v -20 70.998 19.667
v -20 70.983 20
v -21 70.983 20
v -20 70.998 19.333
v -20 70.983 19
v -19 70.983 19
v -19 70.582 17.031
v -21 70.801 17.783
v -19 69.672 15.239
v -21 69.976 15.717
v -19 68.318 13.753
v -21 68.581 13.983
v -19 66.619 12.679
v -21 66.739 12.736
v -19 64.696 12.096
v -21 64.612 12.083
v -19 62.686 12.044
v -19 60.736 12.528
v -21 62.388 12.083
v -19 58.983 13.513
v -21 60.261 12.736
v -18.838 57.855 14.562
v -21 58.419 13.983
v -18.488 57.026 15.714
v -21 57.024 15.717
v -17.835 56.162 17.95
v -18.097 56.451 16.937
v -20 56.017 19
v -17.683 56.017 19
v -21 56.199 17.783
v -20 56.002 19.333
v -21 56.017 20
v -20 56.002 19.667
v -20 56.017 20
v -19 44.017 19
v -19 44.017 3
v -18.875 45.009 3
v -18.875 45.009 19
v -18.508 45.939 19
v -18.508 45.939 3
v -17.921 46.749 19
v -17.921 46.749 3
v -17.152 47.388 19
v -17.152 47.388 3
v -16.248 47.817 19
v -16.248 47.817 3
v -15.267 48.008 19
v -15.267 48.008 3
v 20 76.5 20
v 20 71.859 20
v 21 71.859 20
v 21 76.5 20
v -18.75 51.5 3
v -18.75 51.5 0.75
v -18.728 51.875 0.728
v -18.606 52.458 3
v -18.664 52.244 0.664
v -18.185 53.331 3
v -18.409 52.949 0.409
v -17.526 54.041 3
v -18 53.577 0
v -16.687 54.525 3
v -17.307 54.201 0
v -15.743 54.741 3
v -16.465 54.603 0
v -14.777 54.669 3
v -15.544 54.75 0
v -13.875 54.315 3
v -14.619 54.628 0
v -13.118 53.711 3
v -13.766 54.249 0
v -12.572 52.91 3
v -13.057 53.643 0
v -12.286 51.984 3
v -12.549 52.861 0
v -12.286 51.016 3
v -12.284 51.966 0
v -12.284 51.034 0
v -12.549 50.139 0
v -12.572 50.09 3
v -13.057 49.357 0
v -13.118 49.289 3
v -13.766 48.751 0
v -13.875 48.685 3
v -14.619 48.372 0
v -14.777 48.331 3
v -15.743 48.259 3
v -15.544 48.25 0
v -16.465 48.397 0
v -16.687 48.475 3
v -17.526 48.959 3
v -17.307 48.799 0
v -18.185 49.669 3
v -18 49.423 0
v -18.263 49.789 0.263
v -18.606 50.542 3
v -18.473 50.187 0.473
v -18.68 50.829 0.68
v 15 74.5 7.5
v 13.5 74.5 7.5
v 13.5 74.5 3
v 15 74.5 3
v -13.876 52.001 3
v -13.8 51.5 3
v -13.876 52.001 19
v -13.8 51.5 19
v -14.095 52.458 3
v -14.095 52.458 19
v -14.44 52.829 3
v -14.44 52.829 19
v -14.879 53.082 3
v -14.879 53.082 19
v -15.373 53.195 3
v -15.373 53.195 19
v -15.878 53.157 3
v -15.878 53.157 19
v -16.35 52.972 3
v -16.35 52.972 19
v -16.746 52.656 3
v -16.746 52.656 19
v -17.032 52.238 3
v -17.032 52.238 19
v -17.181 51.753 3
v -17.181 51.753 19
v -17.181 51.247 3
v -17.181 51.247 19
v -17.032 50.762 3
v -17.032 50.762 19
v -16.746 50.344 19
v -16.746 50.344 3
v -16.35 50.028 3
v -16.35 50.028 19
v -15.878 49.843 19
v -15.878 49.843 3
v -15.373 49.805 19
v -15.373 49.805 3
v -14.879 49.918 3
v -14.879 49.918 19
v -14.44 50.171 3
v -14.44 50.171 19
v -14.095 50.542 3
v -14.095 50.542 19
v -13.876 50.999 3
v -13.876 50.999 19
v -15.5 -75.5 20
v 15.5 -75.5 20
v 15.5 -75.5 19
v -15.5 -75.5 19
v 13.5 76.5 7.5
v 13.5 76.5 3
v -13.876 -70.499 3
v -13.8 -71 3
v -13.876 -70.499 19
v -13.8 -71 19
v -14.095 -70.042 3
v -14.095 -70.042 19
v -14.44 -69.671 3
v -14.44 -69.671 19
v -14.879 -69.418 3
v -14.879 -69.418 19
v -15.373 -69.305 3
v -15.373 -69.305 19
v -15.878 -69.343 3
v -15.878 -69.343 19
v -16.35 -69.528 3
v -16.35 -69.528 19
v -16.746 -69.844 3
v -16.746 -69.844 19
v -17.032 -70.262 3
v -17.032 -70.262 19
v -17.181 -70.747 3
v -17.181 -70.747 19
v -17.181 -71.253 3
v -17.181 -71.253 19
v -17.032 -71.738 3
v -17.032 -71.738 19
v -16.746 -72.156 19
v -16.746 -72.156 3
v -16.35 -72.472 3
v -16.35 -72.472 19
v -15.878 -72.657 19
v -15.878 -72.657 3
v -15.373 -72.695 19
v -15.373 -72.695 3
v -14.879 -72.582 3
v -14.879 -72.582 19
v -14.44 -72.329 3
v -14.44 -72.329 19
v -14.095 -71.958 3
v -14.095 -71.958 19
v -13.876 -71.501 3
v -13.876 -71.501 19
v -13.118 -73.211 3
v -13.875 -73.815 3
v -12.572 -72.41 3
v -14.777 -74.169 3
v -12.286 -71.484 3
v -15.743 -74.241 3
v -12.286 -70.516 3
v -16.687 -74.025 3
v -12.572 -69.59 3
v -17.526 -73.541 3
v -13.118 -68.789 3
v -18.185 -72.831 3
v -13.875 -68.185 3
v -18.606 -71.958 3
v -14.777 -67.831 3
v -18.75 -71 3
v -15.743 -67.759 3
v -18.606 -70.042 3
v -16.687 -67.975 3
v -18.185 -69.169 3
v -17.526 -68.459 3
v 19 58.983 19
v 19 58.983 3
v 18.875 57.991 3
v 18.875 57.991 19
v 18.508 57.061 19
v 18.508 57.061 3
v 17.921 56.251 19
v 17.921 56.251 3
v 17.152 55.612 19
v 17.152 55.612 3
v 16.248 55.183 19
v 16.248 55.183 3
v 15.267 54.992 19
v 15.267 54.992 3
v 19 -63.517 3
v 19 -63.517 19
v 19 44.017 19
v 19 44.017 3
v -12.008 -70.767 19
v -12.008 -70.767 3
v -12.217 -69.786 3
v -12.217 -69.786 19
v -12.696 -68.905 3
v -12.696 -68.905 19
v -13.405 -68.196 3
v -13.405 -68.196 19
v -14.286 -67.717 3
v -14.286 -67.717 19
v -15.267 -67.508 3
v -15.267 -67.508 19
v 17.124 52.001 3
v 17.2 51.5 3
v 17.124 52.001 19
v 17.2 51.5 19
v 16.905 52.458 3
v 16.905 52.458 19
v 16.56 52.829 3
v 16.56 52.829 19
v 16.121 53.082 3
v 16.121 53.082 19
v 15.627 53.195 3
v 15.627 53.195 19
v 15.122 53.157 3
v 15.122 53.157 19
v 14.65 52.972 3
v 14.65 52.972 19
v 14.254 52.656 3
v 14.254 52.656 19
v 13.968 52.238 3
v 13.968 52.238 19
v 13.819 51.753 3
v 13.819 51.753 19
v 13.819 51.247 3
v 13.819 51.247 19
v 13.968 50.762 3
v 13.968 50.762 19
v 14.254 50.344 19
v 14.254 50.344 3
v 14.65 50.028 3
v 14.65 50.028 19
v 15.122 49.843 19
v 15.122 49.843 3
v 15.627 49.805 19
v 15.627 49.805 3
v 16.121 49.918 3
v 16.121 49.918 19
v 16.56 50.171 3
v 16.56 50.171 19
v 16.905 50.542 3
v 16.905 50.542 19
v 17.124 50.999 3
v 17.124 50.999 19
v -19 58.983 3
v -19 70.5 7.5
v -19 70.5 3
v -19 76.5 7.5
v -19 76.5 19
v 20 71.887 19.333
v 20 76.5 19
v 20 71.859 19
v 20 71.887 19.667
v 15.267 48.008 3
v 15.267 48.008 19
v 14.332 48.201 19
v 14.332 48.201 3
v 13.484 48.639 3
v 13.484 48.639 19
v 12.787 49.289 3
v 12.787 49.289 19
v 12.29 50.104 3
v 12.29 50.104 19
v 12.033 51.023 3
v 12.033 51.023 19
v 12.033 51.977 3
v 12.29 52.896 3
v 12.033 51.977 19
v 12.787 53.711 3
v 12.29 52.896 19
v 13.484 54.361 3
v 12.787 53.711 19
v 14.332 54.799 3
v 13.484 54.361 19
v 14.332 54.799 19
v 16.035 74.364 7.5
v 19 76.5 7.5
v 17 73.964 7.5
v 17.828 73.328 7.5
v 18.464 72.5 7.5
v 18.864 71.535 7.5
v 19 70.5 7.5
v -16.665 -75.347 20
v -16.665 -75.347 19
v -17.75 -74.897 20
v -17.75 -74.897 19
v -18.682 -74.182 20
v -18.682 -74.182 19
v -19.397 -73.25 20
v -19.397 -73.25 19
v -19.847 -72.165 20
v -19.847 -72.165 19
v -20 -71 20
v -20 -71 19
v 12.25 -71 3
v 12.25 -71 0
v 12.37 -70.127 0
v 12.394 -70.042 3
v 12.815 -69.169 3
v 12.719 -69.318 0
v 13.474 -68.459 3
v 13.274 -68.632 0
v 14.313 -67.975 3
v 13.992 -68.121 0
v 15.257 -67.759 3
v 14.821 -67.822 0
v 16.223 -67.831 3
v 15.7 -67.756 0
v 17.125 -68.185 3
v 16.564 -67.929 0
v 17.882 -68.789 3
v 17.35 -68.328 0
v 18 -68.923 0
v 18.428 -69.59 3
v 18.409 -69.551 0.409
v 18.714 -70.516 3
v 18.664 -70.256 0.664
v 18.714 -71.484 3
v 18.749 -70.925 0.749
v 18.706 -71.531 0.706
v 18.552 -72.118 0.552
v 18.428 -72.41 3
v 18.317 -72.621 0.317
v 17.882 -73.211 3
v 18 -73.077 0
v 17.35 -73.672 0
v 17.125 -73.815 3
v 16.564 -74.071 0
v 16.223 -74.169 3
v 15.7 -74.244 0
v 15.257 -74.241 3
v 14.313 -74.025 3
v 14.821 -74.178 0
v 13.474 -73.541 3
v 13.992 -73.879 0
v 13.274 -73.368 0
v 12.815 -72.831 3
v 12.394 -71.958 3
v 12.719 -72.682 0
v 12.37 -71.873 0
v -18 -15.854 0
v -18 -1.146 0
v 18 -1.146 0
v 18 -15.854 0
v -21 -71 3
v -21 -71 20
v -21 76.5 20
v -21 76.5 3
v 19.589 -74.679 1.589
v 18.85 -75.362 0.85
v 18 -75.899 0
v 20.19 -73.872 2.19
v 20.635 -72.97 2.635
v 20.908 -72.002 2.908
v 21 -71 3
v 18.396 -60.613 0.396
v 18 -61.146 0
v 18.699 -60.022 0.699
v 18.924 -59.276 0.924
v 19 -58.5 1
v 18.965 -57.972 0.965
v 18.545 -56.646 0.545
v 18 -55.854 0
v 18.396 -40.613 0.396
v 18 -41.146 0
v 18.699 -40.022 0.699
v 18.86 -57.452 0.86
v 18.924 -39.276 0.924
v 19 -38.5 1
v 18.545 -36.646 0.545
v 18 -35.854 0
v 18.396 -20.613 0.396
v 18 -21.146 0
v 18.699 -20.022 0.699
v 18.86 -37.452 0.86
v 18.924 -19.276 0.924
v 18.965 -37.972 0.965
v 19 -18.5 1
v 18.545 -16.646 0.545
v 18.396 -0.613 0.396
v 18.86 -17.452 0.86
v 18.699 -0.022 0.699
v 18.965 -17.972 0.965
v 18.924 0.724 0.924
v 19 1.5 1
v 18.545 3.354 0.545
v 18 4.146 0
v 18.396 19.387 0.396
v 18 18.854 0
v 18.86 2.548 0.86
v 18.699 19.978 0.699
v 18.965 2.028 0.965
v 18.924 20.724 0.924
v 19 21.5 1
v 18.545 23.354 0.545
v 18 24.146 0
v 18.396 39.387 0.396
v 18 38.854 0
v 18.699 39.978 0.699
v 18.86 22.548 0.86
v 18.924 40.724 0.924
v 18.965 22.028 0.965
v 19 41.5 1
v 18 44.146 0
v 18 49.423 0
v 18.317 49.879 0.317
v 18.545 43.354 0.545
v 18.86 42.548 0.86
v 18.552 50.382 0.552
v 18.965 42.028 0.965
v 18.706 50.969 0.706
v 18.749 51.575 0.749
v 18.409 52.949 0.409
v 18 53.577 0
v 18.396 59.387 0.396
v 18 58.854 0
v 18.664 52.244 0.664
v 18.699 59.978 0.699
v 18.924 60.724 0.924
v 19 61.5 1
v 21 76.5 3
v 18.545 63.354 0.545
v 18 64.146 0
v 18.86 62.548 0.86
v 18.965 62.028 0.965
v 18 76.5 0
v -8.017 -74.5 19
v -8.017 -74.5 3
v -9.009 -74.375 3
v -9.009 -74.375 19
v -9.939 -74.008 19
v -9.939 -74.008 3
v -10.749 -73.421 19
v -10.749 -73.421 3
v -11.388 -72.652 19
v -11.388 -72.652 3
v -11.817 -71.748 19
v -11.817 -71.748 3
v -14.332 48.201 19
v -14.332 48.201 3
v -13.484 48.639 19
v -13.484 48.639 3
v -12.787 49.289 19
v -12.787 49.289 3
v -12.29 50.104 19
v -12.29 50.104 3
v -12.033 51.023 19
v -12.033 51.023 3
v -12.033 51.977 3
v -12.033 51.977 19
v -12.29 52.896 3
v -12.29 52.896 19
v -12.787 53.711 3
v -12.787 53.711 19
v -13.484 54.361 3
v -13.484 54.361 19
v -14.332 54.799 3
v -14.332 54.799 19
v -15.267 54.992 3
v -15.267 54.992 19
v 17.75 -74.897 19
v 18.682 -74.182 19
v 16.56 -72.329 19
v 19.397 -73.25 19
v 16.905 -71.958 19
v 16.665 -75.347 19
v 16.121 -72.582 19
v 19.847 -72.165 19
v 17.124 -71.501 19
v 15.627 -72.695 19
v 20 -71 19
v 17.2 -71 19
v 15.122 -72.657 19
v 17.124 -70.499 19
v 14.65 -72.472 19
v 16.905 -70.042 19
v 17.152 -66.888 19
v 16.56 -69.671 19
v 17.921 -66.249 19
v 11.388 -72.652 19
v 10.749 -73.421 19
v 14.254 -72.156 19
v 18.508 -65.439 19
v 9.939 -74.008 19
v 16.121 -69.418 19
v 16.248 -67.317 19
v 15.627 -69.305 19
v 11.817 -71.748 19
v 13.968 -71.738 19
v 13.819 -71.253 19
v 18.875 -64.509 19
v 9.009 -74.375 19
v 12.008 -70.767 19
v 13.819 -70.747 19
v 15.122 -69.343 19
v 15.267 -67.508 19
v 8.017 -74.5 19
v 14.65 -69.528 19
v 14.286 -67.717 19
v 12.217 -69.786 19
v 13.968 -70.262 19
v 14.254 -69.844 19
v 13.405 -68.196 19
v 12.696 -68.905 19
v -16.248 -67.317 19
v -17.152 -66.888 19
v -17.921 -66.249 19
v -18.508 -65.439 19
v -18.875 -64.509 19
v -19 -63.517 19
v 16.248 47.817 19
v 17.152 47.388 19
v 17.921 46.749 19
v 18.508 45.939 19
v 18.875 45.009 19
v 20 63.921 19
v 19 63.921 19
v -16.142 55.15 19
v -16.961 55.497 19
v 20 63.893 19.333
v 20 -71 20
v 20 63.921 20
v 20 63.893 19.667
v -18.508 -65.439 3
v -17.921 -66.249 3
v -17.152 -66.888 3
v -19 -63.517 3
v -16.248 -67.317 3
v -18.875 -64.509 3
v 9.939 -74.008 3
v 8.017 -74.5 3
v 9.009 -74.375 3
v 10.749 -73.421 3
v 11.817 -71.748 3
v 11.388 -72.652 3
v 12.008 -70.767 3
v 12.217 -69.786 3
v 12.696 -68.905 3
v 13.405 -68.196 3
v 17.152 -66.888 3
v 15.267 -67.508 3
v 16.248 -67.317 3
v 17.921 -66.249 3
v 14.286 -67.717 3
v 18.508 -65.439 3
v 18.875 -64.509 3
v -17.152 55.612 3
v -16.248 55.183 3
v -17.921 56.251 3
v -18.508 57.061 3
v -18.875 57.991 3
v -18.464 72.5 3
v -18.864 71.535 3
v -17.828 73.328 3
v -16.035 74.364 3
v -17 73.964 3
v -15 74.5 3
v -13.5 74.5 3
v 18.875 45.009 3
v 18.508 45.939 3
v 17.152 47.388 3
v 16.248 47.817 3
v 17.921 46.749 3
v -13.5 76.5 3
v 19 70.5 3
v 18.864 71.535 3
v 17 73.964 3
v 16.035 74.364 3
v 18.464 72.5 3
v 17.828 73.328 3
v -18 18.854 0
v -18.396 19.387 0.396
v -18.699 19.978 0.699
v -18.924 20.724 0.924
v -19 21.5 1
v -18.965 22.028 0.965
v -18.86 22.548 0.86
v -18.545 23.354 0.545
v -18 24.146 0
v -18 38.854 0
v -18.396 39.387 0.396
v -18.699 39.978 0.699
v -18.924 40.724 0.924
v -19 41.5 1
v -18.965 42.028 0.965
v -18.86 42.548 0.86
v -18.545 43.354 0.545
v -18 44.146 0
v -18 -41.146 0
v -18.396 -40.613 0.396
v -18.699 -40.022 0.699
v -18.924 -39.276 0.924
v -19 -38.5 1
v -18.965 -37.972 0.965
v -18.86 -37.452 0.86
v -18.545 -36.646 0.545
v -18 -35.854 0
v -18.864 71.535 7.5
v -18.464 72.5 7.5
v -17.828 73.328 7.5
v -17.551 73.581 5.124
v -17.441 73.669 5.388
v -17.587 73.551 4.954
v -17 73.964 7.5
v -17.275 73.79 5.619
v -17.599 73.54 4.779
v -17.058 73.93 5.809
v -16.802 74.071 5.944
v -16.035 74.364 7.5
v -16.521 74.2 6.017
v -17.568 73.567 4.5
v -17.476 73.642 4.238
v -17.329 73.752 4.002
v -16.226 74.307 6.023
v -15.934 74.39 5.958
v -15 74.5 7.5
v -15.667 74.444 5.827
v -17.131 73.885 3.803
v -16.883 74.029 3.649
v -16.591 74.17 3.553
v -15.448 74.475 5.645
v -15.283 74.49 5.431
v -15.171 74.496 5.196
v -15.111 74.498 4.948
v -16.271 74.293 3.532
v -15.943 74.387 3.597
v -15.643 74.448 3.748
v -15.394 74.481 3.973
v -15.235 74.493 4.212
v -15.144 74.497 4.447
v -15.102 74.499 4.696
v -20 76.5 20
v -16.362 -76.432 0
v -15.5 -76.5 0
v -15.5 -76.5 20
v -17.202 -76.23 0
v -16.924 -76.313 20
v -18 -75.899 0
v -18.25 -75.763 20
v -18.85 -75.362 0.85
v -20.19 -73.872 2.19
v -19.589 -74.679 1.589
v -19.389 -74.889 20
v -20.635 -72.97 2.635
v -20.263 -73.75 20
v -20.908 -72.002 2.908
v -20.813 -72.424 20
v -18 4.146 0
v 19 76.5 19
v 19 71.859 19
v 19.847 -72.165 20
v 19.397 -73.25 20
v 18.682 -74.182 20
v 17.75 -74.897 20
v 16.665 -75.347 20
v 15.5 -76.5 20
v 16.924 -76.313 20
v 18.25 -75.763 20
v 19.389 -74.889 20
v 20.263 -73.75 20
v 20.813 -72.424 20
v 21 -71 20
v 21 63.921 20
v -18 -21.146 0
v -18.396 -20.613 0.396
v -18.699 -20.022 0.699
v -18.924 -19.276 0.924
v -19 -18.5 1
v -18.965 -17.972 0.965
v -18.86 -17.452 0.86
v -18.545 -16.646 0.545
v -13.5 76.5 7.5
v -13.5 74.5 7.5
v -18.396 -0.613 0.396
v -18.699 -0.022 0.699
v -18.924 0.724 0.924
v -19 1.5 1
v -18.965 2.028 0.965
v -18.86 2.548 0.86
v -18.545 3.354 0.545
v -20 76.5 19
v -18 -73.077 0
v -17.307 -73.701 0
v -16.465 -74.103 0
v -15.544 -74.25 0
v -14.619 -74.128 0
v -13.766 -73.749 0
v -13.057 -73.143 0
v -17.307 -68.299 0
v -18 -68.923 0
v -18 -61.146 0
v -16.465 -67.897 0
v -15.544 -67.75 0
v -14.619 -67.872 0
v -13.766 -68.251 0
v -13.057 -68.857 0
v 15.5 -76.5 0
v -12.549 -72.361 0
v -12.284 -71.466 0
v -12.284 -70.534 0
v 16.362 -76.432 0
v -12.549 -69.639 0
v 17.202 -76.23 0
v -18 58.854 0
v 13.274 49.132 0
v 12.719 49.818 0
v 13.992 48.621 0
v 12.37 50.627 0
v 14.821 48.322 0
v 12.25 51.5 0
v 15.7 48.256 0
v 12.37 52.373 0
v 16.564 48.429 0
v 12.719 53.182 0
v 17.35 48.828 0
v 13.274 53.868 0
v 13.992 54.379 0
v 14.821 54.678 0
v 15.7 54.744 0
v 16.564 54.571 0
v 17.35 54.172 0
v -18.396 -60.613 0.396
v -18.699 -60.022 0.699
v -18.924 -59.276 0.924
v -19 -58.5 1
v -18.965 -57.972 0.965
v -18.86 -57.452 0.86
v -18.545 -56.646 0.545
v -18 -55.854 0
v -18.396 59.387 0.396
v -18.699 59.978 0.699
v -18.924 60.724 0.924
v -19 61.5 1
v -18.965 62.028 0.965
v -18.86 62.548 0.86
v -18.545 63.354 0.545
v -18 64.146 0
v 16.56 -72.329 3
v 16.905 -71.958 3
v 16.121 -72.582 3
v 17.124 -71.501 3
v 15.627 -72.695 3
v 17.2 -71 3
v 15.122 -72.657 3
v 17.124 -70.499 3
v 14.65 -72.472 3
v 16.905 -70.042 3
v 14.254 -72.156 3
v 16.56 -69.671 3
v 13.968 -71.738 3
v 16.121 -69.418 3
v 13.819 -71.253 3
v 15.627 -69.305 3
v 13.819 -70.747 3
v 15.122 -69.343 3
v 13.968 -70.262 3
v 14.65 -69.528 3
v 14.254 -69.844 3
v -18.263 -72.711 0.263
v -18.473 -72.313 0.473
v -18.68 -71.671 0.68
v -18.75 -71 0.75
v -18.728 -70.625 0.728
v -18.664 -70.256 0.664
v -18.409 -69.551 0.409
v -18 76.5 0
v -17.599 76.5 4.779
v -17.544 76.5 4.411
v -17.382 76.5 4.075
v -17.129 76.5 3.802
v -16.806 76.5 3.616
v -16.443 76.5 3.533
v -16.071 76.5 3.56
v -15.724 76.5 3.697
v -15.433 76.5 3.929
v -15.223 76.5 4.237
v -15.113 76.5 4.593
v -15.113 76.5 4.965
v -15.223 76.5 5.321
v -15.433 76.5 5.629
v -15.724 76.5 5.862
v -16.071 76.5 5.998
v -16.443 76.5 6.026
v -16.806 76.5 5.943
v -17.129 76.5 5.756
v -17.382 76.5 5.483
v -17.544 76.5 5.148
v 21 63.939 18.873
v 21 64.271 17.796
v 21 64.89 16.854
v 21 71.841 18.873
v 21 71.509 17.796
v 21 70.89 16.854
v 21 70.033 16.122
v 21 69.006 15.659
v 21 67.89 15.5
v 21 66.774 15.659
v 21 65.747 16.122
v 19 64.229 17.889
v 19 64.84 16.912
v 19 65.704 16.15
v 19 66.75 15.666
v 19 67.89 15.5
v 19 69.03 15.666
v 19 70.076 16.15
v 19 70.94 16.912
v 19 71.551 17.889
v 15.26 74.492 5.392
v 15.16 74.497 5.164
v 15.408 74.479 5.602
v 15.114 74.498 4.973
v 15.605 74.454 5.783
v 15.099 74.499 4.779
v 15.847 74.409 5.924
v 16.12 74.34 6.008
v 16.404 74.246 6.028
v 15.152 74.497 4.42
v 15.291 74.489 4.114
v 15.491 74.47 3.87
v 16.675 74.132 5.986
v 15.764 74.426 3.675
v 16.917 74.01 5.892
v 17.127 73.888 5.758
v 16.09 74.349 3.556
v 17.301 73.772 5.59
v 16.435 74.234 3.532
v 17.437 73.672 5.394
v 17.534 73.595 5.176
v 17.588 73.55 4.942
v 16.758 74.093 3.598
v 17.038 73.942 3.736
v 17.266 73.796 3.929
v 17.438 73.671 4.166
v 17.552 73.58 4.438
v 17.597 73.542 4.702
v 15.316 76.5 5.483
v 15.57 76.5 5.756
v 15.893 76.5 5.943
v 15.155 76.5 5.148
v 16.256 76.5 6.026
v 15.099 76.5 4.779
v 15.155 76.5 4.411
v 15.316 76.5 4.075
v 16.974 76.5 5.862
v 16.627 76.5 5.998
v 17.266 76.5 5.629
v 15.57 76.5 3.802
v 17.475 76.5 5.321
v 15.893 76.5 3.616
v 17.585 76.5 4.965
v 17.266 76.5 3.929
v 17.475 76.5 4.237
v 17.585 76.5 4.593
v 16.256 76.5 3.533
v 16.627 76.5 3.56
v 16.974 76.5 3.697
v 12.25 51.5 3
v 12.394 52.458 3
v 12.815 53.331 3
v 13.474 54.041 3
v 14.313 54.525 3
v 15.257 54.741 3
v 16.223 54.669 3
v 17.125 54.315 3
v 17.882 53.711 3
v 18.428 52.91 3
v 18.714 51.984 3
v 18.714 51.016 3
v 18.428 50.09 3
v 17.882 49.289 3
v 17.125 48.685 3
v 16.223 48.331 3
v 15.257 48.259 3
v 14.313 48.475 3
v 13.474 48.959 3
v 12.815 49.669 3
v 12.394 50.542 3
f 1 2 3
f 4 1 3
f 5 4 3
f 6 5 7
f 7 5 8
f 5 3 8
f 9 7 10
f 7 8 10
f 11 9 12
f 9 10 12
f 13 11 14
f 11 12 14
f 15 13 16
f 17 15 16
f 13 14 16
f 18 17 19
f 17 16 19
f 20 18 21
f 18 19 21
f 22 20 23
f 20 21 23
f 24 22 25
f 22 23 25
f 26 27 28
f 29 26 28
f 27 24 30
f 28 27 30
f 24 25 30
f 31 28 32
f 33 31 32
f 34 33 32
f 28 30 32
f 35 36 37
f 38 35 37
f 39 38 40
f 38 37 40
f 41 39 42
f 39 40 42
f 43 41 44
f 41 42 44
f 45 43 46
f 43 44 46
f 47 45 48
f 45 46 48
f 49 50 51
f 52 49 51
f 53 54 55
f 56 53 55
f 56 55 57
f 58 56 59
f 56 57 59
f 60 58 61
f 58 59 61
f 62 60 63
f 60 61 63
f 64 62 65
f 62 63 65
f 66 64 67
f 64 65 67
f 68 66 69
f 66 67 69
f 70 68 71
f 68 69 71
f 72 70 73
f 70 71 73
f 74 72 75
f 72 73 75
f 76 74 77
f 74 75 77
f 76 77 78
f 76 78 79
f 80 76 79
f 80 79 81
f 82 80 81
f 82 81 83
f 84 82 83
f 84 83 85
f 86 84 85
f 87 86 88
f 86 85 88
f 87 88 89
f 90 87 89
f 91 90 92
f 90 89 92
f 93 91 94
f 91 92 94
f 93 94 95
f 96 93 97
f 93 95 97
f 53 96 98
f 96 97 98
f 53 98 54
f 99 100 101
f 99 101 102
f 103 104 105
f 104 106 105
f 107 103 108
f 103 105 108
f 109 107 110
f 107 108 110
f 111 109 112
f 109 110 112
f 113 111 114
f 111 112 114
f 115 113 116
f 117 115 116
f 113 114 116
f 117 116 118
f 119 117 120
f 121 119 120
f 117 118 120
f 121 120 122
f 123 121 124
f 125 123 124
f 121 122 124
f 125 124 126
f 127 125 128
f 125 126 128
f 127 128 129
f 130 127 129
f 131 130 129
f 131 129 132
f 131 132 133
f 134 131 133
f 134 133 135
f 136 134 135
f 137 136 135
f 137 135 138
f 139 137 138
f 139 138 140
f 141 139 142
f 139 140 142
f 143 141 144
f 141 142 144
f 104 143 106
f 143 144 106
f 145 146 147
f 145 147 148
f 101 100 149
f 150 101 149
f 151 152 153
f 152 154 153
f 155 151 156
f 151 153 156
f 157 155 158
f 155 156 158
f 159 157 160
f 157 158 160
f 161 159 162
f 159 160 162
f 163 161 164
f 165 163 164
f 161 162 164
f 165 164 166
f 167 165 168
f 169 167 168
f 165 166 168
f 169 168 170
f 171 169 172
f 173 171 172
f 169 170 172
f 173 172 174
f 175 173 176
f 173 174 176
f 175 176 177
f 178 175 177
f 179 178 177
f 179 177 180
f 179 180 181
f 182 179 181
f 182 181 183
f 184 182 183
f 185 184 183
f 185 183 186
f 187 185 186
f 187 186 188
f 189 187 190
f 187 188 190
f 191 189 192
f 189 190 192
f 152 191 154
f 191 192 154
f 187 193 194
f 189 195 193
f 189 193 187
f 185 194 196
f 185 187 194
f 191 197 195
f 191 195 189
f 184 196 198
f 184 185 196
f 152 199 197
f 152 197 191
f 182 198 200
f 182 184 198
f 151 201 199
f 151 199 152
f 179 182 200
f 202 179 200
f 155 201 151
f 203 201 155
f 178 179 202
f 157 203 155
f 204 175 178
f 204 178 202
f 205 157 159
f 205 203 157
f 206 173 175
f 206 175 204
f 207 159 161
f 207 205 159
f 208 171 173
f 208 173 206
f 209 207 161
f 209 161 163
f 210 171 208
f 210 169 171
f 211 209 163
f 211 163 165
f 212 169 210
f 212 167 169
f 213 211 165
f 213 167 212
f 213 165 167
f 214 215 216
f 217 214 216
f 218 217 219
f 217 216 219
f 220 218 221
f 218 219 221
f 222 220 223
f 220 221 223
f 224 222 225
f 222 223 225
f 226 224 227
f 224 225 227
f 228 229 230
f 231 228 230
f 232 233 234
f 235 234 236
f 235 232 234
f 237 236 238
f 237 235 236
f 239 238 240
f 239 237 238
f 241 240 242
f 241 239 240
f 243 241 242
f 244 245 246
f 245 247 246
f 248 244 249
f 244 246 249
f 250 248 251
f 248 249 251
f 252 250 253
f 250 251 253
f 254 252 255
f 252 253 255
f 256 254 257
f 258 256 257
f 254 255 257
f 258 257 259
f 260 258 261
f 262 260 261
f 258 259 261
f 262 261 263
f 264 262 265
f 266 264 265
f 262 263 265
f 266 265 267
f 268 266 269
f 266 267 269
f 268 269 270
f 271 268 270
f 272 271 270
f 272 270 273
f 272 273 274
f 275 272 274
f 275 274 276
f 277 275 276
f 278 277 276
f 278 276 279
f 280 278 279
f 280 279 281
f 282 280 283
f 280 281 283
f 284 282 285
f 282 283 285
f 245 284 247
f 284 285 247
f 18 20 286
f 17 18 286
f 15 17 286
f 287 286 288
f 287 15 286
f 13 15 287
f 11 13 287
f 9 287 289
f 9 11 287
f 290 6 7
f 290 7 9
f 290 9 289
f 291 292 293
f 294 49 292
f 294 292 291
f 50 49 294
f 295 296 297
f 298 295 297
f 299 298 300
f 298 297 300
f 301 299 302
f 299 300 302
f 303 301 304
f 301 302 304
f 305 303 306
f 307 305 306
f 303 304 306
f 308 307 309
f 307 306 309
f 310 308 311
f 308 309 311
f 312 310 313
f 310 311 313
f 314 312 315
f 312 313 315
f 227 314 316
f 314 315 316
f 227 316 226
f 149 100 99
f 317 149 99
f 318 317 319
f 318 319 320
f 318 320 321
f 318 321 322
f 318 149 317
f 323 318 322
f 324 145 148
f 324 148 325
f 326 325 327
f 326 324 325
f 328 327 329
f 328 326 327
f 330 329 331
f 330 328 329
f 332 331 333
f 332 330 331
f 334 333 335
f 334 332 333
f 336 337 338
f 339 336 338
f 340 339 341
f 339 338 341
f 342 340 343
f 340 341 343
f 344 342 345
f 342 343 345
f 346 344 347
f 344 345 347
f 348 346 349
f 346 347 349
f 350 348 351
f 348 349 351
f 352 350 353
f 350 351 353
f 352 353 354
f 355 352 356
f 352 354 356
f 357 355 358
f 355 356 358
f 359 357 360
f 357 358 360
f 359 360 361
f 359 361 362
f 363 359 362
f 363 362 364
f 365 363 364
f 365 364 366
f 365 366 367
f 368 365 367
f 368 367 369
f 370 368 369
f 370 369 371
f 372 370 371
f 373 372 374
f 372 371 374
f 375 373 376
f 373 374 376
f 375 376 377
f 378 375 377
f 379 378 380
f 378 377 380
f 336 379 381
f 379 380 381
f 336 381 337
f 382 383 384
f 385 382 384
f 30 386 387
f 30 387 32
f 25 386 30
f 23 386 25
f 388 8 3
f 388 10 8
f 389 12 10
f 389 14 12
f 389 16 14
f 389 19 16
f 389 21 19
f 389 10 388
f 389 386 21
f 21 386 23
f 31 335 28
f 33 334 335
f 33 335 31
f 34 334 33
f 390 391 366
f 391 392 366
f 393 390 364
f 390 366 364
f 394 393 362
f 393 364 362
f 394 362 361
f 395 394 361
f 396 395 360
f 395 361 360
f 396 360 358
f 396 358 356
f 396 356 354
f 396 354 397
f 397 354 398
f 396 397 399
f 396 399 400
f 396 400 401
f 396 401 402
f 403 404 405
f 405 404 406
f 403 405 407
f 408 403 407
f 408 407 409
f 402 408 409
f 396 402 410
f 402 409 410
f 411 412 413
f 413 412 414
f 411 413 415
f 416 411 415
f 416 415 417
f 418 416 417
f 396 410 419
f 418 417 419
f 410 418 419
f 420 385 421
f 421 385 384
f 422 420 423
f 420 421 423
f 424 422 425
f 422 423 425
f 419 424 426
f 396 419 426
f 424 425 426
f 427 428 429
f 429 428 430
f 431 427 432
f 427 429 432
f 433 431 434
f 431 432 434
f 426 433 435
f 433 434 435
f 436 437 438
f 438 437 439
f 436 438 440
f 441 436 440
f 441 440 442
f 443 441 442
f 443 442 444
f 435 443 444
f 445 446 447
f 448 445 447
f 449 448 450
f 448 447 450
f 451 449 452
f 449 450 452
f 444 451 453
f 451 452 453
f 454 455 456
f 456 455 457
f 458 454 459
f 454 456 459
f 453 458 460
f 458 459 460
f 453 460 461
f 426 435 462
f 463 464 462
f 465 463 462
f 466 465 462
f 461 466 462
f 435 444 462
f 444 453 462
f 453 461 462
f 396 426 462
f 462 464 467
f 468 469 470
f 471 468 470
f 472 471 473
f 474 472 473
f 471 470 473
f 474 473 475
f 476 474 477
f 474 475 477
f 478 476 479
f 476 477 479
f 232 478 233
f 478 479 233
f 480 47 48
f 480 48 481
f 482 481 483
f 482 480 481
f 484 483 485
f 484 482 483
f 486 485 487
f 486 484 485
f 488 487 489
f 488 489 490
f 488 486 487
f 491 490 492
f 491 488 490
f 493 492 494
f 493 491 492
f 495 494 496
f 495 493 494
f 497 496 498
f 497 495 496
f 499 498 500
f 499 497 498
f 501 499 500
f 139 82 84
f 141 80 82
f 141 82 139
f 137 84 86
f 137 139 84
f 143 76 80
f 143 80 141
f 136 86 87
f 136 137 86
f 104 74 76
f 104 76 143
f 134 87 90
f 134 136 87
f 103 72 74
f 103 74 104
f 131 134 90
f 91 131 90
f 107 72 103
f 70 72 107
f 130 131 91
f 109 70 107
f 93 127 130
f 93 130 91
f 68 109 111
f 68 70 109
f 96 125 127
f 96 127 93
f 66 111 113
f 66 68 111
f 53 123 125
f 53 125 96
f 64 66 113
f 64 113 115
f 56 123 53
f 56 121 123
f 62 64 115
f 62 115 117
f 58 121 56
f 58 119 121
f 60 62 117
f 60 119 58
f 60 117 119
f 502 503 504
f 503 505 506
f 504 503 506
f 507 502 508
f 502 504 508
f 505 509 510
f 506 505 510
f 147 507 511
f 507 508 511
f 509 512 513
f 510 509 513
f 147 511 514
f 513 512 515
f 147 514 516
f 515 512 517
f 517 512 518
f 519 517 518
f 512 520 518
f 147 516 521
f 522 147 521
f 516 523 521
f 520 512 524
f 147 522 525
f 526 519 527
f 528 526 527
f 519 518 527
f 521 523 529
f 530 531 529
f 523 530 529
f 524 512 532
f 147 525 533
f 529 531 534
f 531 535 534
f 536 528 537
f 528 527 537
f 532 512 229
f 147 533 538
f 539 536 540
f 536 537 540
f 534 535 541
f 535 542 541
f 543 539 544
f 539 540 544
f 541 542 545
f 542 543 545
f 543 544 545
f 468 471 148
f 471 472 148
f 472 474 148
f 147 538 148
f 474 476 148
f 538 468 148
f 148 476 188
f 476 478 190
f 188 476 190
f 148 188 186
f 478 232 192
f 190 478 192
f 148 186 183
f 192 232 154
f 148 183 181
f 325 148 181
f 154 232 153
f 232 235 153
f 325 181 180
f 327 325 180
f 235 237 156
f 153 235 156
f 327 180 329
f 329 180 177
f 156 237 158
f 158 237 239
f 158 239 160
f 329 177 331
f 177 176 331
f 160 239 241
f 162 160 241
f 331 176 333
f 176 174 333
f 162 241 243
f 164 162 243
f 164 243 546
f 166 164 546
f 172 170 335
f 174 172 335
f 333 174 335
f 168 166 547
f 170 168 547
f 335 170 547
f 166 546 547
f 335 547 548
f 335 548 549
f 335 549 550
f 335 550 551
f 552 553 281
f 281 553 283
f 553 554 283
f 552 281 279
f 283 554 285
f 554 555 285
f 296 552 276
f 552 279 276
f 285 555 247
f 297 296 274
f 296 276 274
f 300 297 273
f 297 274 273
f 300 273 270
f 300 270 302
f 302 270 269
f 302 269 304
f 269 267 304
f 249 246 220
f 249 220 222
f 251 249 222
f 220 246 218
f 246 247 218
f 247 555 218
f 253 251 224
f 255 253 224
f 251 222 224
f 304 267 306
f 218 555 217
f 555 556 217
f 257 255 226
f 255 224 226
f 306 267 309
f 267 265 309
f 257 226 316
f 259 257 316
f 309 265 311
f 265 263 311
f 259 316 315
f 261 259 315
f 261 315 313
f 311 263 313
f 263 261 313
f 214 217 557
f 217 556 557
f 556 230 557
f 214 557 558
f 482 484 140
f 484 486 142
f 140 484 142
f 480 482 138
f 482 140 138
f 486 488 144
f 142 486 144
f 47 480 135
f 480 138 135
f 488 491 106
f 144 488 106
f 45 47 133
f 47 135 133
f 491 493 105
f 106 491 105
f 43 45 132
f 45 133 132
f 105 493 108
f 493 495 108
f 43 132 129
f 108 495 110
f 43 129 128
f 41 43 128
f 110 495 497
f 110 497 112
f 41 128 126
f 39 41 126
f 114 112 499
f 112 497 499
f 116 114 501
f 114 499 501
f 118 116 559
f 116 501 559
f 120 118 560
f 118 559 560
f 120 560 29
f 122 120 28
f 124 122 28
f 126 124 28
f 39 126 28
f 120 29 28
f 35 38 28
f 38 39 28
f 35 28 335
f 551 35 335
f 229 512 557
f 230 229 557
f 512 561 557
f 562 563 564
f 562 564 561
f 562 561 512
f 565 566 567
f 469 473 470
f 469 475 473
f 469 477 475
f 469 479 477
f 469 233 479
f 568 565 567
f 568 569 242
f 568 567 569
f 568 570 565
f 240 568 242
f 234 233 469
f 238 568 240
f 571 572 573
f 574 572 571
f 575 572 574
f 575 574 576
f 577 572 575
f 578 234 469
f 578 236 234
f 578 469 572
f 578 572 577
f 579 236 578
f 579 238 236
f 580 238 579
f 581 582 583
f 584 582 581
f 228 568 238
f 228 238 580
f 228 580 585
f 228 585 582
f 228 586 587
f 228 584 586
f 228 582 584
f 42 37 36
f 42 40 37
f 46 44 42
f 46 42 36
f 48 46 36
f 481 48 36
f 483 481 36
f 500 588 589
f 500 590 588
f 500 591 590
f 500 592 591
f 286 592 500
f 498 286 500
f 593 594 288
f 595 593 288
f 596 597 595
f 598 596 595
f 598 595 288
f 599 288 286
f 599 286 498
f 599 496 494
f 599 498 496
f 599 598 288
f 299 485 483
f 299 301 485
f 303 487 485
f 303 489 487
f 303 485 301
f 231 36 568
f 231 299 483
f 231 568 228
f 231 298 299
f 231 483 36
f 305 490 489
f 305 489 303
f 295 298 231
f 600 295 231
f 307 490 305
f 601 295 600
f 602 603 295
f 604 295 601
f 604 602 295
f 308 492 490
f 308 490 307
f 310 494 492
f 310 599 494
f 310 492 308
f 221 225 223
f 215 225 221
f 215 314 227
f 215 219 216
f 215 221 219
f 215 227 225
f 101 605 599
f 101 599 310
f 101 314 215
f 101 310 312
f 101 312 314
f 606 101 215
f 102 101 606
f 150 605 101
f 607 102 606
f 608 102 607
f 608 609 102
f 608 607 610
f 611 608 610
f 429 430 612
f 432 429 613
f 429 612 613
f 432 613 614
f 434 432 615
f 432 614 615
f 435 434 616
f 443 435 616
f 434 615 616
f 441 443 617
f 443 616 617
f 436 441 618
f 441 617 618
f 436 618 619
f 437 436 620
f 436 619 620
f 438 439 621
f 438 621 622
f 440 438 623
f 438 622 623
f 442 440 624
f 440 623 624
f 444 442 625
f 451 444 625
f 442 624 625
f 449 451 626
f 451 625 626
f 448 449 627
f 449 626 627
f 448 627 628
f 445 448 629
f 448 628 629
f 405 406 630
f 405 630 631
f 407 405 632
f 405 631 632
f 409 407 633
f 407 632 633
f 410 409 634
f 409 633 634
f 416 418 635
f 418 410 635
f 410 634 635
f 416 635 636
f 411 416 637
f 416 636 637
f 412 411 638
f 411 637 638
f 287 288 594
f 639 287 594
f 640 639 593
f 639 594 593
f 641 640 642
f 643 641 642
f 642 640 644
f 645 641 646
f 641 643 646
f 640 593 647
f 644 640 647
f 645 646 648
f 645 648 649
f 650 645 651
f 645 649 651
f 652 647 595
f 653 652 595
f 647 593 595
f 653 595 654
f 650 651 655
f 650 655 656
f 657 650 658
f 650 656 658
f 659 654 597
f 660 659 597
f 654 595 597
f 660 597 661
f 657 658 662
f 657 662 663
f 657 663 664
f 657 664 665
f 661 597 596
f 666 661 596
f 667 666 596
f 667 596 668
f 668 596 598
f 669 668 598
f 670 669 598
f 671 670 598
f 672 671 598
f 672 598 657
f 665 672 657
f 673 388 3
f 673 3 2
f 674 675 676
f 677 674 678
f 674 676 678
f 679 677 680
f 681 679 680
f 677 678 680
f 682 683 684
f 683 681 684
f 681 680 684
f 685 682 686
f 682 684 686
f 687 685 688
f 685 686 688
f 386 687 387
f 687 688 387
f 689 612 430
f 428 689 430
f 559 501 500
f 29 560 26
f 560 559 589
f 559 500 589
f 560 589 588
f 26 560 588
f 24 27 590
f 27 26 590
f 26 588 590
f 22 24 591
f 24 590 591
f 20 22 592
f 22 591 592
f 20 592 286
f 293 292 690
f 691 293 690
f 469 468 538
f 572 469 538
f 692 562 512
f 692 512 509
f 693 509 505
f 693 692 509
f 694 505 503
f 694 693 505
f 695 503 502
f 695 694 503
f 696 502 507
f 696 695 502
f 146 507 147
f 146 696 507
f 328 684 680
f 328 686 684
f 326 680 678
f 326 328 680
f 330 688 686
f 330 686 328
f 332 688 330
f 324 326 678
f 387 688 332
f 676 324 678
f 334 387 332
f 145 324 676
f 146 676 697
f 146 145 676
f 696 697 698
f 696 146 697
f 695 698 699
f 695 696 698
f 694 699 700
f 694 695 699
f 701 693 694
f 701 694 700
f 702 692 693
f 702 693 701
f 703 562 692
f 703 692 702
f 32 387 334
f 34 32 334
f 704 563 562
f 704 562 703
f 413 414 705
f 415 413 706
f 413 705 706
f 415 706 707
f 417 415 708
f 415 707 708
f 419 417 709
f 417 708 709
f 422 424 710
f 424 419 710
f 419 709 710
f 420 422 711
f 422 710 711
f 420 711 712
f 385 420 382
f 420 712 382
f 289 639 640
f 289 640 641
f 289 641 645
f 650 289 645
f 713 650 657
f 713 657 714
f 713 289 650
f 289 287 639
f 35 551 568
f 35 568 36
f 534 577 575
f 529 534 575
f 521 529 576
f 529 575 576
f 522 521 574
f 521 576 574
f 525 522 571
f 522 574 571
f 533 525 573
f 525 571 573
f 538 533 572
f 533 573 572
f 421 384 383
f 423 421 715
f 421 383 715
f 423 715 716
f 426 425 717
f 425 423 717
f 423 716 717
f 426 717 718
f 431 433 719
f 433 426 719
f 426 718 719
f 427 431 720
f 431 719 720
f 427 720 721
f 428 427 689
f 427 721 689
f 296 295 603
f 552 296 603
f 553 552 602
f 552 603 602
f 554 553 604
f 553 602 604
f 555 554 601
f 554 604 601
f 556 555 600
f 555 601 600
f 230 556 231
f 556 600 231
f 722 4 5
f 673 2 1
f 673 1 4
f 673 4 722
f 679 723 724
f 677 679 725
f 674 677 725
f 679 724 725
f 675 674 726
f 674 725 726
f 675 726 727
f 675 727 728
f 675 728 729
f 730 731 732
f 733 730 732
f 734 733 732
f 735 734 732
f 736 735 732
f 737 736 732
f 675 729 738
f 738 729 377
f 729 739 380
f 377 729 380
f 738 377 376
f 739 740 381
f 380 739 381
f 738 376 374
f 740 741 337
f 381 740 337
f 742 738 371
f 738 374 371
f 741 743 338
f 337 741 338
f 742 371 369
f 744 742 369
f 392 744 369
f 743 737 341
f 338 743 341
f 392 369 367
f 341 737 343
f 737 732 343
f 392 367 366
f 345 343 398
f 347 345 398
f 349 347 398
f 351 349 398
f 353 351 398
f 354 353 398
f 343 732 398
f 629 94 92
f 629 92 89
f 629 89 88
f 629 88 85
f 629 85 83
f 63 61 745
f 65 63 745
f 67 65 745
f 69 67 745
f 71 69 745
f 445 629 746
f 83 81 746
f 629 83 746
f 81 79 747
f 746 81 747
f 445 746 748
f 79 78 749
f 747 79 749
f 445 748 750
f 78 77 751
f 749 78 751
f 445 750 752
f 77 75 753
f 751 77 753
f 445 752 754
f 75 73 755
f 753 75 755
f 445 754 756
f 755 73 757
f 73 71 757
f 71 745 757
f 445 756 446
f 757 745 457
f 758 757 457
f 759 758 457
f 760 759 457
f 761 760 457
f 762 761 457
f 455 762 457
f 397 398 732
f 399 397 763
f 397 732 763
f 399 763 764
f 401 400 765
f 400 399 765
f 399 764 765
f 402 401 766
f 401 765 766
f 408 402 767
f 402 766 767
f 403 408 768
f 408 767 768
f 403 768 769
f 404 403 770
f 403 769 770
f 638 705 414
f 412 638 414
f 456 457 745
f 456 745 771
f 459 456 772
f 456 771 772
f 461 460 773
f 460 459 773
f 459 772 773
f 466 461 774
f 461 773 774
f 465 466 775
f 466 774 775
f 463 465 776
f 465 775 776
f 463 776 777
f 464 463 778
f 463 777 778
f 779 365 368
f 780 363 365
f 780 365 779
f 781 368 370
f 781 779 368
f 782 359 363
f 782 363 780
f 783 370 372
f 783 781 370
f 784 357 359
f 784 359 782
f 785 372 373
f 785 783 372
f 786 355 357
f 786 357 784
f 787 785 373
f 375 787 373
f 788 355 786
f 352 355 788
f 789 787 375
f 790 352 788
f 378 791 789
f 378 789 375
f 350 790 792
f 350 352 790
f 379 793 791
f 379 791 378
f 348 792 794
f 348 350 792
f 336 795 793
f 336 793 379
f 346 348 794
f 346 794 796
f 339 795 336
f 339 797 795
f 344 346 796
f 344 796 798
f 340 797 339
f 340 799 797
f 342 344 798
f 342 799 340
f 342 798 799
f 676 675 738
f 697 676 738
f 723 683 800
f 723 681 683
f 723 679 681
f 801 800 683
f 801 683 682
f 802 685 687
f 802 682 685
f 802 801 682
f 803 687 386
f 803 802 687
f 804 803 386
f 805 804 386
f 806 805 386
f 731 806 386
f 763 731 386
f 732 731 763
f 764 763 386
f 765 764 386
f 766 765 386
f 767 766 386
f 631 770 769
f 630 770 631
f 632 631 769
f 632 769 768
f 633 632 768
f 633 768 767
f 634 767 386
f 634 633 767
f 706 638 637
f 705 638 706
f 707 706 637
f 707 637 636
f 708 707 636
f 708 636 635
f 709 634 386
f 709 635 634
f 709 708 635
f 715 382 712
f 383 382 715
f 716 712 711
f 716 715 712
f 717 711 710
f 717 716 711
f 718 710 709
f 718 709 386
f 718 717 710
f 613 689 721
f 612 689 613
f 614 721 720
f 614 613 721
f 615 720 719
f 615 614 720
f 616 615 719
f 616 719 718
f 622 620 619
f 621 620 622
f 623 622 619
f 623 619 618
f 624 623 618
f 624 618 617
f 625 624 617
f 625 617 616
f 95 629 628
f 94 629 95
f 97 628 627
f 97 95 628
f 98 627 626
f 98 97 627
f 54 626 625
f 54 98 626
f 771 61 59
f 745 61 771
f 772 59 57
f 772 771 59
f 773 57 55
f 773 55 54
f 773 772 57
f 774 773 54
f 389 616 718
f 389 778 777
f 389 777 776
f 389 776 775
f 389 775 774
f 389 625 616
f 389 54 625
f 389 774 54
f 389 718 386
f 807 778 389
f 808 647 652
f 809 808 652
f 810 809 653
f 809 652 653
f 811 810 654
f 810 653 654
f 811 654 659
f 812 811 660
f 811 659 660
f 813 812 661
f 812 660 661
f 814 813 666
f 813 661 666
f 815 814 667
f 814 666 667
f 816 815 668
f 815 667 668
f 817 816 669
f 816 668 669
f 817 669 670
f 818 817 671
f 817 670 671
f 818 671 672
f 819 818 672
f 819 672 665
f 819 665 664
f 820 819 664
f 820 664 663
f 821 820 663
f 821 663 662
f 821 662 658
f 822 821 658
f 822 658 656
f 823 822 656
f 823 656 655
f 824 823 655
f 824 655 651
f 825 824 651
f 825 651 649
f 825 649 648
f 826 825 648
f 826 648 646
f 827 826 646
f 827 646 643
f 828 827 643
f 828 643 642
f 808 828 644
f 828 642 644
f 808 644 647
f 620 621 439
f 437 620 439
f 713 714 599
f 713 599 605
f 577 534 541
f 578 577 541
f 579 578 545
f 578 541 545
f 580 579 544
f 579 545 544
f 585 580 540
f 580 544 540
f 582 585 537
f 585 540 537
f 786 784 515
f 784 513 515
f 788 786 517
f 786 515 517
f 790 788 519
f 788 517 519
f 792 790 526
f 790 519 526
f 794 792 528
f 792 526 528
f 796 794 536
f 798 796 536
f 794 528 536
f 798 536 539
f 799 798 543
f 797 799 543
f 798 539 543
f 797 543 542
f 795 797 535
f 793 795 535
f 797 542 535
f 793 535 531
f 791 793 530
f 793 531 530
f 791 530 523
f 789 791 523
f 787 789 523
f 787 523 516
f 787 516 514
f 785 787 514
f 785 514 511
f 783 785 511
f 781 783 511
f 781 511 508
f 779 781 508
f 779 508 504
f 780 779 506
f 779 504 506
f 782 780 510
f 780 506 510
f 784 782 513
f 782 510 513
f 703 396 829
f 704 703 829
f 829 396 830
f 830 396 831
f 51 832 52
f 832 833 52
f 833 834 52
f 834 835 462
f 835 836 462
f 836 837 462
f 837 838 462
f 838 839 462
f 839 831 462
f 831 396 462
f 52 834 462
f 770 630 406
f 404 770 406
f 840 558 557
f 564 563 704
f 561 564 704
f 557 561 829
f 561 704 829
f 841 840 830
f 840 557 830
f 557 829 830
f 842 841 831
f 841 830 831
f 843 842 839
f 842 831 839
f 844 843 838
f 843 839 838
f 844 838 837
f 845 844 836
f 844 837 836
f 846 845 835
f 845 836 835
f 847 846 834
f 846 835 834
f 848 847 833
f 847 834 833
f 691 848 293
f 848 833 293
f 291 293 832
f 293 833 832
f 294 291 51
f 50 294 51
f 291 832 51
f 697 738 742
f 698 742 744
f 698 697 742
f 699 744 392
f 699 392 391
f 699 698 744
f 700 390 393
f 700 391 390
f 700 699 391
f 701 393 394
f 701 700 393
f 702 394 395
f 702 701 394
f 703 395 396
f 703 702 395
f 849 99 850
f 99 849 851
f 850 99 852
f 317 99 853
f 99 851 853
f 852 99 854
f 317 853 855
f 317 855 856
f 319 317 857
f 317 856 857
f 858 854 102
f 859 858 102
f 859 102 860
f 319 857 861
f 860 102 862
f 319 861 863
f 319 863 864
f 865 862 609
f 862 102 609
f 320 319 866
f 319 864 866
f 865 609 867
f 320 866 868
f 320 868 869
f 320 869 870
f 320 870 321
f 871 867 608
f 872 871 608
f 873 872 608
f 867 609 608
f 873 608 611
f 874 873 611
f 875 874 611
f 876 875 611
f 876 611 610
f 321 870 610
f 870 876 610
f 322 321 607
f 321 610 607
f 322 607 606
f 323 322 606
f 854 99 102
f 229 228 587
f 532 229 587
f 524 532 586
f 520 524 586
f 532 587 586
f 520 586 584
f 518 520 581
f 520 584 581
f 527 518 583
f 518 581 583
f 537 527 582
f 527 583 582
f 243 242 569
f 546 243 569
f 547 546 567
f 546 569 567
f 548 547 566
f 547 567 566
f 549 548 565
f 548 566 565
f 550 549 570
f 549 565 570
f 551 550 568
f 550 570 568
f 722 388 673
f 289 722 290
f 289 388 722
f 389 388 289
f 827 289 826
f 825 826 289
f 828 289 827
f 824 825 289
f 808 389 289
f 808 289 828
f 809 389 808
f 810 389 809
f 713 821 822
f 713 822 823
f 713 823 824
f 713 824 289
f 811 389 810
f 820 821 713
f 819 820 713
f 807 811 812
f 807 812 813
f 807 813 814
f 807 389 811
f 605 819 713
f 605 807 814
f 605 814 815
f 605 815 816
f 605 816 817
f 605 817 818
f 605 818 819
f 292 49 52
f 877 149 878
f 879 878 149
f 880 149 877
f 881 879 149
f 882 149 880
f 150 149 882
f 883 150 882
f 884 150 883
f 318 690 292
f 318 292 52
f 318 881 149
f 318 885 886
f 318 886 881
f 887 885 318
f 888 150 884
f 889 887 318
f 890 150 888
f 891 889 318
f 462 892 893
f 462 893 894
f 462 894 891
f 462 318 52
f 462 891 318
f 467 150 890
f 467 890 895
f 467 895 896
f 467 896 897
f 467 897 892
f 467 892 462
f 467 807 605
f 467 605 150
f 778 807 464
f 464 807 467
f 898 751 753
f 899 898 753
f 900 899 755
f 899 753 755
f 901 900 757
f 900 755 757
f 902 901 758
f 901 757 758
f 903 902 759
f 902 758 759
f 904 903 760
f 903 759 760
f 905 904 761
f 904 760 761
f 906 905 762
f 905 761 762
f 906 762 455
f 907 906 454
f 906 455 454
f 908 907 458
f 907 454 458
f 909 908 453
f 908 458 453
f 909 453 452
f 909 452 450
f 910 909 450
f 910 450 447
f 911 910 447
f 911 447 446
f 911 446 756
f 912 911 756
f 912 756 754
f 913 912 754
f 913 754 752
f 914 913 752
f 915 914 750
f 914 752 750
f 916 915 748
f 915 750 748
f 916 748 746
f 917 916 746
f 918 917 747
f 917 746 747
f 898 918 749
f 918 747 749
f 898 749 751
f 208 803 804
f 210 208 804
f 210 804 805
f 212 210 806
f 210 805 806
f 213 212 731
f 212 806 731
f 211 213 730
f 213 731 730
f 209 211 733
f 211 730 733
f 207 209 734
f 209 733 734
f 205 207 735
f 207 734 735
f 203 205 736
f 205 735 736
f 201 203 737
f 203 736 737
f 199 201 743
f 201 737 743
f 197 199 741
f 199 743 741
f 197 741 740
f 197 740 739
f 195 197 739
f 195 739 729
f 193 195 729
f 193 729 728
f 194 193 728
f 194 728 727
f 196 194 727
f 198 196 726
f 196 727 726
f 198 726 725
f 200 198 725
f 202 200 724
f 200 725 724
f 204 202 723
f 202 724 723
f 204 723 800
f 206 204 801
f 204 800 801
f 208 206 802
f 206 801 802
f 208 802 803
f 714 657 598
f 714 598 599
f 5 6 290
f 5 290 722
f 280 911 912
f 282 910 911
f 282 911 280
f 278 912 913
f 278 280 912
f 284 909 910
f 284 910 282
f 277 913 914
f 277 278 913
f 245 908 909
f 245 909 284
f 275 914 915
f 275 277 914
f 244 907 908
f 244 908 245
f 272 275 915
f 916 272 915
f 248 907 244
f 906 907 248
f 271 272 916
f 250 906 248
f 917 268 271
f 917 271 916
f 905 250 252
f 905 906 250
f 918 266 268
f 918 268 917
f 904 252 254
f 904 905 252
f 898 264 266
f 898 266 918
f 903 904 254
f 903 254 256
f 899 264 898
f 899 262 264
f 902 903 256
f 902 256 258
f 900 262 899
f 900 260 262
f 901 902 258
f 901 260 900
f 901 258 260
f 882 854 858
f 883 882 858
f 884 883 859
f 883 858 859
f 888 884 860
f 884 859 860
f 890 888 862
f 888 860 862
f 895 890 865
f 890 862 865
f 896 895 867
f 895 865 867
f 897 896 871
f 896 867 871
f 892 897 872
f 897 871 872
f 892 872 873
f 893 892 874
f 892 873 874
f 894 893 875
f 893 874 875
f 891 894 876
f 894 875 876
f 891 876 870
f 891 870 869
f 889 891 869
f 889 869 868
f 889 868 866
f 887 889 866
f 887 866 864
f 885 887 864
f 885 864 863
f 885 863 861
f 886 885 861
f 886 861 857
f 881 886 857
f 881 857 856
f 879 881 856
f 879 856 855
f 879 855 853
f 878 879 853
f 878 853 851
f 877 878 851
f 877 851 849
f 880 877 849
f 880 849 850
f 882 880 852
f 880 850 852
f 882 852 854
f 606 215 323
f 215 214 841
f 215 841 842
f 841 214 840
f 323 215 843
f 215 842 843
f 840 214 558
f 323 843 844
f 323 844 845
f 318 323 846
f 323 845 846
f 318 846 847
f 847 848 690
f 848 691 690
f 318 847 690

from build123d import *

# Parameters (mm, degrees)
SKETCH_1_W                  = 42
SKETCH_1_H                  = 153
EXTRUDE_1_DEPTH             = 20
SKETCH_2_W                  = 38
SKETCH_2_H                  = 149
CUT_EXTRUDE_1_DEPTH         = 17
EXTRUDE_3_DEPTH             = 17
FILLET_START                = 2
FILLET_2_DEPTH              = 18
CHAMFER_1_SIZE              = 3
CUT_EXTRUDE_3_DEPTH         = 82.812285141
SKETCH_8_R                  = 4
CUT_EXTRUDE_4_DEPTH         = 90.533513279
SKETCH_13_W                 = 27
SKETCH_13_H                 = 7.55790464
CUT_EXTRUDE_6_DEPTH         = 17
SKETCH_14_W                 = 38
SKETCH_14_H                 = 15.071373518
CUT_EXTRUDE_7_DEPTH         = 12.5
CUT_EXTRUDE_8_DEPTH         = 1
HOLE_WIZARD_M31_D           = 3.4
HOLE_WIZARD_M31_CBORE_D     = 6.5
HOLE_WIZARD_M31_CBORE_DEPTH = 3
M3X0_51_D                   = 2.5
M3X0_51_DEPTH               = 12.5
M3X0_51_TIP                 = 0.751075774
CUT_EXTRUDE_9_REACH         = 91.534
SKETCH_22_R                 = 7.5
CUT_EXTRUDE_10_REACH        = 91.534
SKETCH_23_R                 = 4


with BuildPart() as part:
    # Эскиз1 → Бобышка-Вытянуть1 (new body)
    with BuildSketch(Plane.XY):
        Rectangle(SKETCH_1_W, SKETCH_1_H)
    extrude(amount=EXTRUDE_1_DEPTH)

    # Эскиз2 → Вырез-Вытянуть1 (cut)
    with BuildSketch(Plane.XY.offset(20)):
        Rectangle(SKETCH_2_W, SKETCH_2_H)
    extrude(amount=-CUT_EXTRUDE_1_DEPTH, mode=Mode.SUBTRACT)

    # Эскиз3 → Бобышка-Вытянуть3 (add)
    with BuildSketch(Plane.XY.offset(20)):
        with BuildLine():
            Line((-19, -71), (-19, -74.5))
            Line((-19, -74.5), (-15.5, -74.5))
            ThreePointArc((-15.5, -74.5), (-13.025126266, -68.525126266), (-19, -71))
        make_face()
        with BuildLine():
            Line((19, -71), (19, -74.5))
            Line((19, -74.5), (15.5, -74.5))
            ThreePointArc((15.5, -74.5), (13.025126266, -68.525126266), (19, -71))
        make_face()
        with BuildLine():
            Line((-15.5, 55), (-19, 55))
            Line((-19, 55), (-19, 48))
            Line((-19, 48), (-15.5, 48))
            ThreePointArc((-15.5, 48), (-12, 51.5), (-15.5, 55))
        make_face()
        with BuildLine():
            Line((15.5, 55), (19, 55))
            Line((19, 55), (19, 48))
            Line((19, 48), (15.5, 48))
            ThreePointArc((15.5, 48), (12, 51.5), (15.5, 55))
        make_face()
    extrude(amount=-EXTRUDE_3_DEPTH)

    # Скругление2: read off the stored shape, not the designer's step
    # Скругление2 outline → Скругление2 (add)
    with BuildSketch(Plane.XY.offset(FILLET_START)):
        with BuildLine():
            ThreePointArc((19, 58.983314774), (17.921186974, 56.25079457), (15.266666667, 54.992213561))
            ThreePointArc((15.266666667, 54.992213561), (15.383268392, 54.998052849), (15.5, 55))
            Line((15.5, 55), (19, 55))
            Line((19, 55), (19, 58.983314774))
        make_face()
        with BuildLine():
            ThreePointArc((15.5, 48), (15.383268392, 48.001947151), (15.266666667, 48.007786439))
            ThreePointArc((15.266666667, 48.007786439), (17.921186974, 46.74920543), (19, 44.016685226))
            Line((19, 44.016685226), (19, 48))
            Line((19, 48), (15.5, 48))
        make_face()
        with BuildLine():
            ThreePointArc((15, 74.5), (17.828427125, 73.328427125), (19, 70.5))
            Line((19, 70.5), (19, 74.5))
            Line((19, 74.5), (15, 74.5))
        make_face()
        with BuildLine():
            Line((19, -71), (19, -63.516685226))
            ThreePointArc((19, -63.516685226), (17.921186974, -66.24920543), (15.266666667, -67.507786439))
            ThreePointArc((15.266666667, -67.507786439), (17.890955179, -68.443961399), (19, -71))
        make_face()
        with BuildLine():
            ThreePointArc((-19, 70.5), (-17.828427125, 73.328427125), (-15, 74.5))
            Line((-15, 74.5), (-19, 74.5))
            Line((-19, 74.5), (-19, 70.5))
        make_face()
        with BuildLine():
            ThreePointArc((15.5, -74.5), (12.943961399, -73.390955179), (12.007786439, -70.766666667))
            ThreePointArc((12.007786439, -70.766666667), (10.74920543, -73.421186974), (8.016685226, -74.5))
            Line((8.016685226, -74.5), (15.5, -74.5))
        make_face()
        with BuildLine():
            ThreePointArc((-15.266666667, 54.992213561), (-17.921186974, 56.25079457), (-19, 58.983314774))
            Line((-19, 58.983314774), (-19, 55))
            Line((-19, 55), (-15.5, 55))
            ThreePointArc((-15.5, 55), (-15.383268392, 54.998052849), (-15.266666667, 54.992213561))
        make_face()
        with BuildLine():
            Line((-15.5, -74.5), (-8.016685226, -74.5))
            ThreePointArc((-8.016685226, -74.5), (-10.74920543, -73.421186974), (-12.007786439, -70.766666667))
            ThreePointArc((-12.007786439, -70.766666667), (-12.943961399, -73.390955179), (-15.5, -74.5))
        make_face()
        with BuildLine():
            ThreePointArc((-19, 44.016685226), (-17.921186974, 46.74920543), (-15.266666667, 48.007786439))
            ThreePointArc((-15.266666667, 48.007786439), (-15.383268392, 48.001947151), (-15.5, 48))
            Line((-15.5, 48), (-19, 48))
            Line((-19, 48), (-19, 44.016685226))
        make_face()
        with BuildLine():
            ThreePointArc((-19, -71), (-17.890955179, -68.443961399), (-15.266666667, -67.507786439))
            ThreePointArc((-15.266666667, -67.507786439), (-17.921186974, -66.24920543), (-19, -63.516685226))
            Line((-19, -63.516685226), (-19, -71))
        make_face()
    extrude(amount=FILLET_2_DEPTH)

    # Фаска1
    chamfer_1_edges = [part.edges().sort_by_distance(p)[0] for p in [
        (-21, 0, 0),
        (21, 0, 0),
    ]]
    chamfer(chamfer_1_edges, length=CHAMFER_1_SIZE)

    # Эскиз7 → Вырез-Вытянуть3 (cut, through all)
    with BuildSketch(Plane.XY.offset(20)):
        with BuildLine():
            Line((-21, -71), (-21, -76.5))
            Line((-21, -76.5), (-15.5, -76.5))
            ThreePointArc((-15.5, -76.5), (-19.389087297, -74.889087297), (-21, -71))
        make_face()
        with BuildLine():
            Line((21, -76.5), (15.5, -76.5))
            ThreePointArc((15.5, -76.5), (19.389087297, -74.889087297), (21, -71))
            Line((21, -71), (21, -76.5))
        make_face()
    extrude(amount=-CUT_EXTRUDE_3_DEPTH, mode=Mode.SUBTRACT)

    # Эскиз8 → Вырез-Вытянуть4 (cut, through all)
    with BuildSketch(Plane.ZY.offset(21)):
        with Locations((-3, -58.5)):
            Circle(SKETCH_8_R)
        with Locations((-3, -38.5)):
            Circle(SKETCH_8_R)
        with Locations((-3, -18.5)):
            Circle(SKETCH_8_R)
        with Locations((-3, 1.5)):
            Circle(SKETCH_8_R)
        with Locations((-3, 21.5)):
            Circle(SKETCH_8_R)
        with Locations((-3, 41.5)):
            Circle(SKETCH_8_R)
        with Locations((-3, 61.5)):
            Circle(SKETCH_8_R)
    extrude(amount=-CUT_EXTRUDE_4_DEPTH, mode=Mode.SUBTRACT)

    # Эскиз13 → Вырез-Вытянуть6 (cut)
    with BuildSketch(Plane.XY.offset(20)):
        with Locations((0, 74.5)):
            Rectangle(SKETCH_13_W, SKETCH_13_H)
    extrude(amount=-CUT_EXTRUDE_6_DEPTH, mode=Mode.SUBTRACT)

    # Эскиз14 → Вырез-Вытянуть7 (cut)
    with BuildSketch(Plane.XY.offset(20)):
        with Locations((0, 76.5)):
            Rectangle(SKETCH_14_W, SKETCH_14_H)
    extrude(amount=-CUT_EXTRUDE_7_DEPTH, mode=Mode.SUBTRACT)

    # Эскиз15 → Вырез-Вытянуть8 (cut)
    with BuildSketch(Plane.XY.offset(20)):
        with BuildLine():
            Line((-20, 76.5), (20, 76.5))
            Line((20, 76.5), (20, -71))
            ThreePointArc((20, -71), (18.681980515, -74.181980515), (15.5, -75.5))
            Line((15.5, -75.5), (-15.5, -75.5))
            ThreePointArc((-15.5, -75.5), (-18.681980515, -74.181980515), (-20, -71))
            Line((-20, -71), (-20, 76.5))
        make_face()
    extrude(amount=-CUT_EXTRUDE_8_DEPTH, mode=Mode.SUBTRACT)

    # Цековка для винта с внутренним шестигранником M31 (through all)
    with Locations(Plane(origin=(0, 0, 0), x_dir=(-1, 0, 0), z_dir=(0, 0, -1))):
        with Locations((-15.5, 51.5), (15.5, 51.5), (15.5, -71), (-15.5, -71)):
            CounterBoreHole(HOLE_WIZARD_M31_D / 2, HOLE_WIZARD_M31_CBORE_D / 2, HOLE_WIZARD_M31_CBORE_DEPTH)

    # Отверстие обработанное метчиком M3x0.51
    with Locations(Plane(origin=(0, 76.5, 0), x_dir=(1, 0, 0), z_dir=(0, 1, 0))):
        with Locations((-16.349186161, -4.77912666), (16.349186161, -4.77912666)):
            Hole(M3X0_51_D / 2, depth=M3X0_51_DEPTH)
            with Locations((0, 0, -(M3X0_51_DEPTH + M3X0_51_TIP / 2))):  # 118° drill point
                Cone(0, M3X0_51_D / 2, M3X0_51_TIP, mode=Mode.SUBTRACT)

    # Эскиз22 → Вырез-Вытянуть9 (cut, up to next)
    with BuildSketch(Plane.ZY.offset(21), mode=Mode.PRIVATE) as cut_extrude_9_sk1:
        with Locations((19.5, 63.5)):
            Circle(SKETCH_22_R)
    cut_extrude_9_tool1 = extrude(cut_extrude_9_sk1.sketch, amount=-CUT_EXTRUDE_9_REACH, mode=Mode.PRIVATE) & part.part
    add(cut_extrude_9_tool1.solids().sort_by_distance((-21, 63.5, 19.5))[0], mode=Mode.SUBTRACT)

    # Эскиз23 → Вырез-Вытянуть10 (cut, up to next)
    with BuildSketch(Plane(origin=(21, 0, 0), x_dir=(0, 0, -1), z_dir=(1, 0, 0)), mode=Mode.PRIVATE) as cut_extrude_10_sk1:
        with Locations((-19.5, 67.89)):
            Circle(SKETCH_23_R)
    cut_extrude_10_tool1 = extrude(cut_extrude_10_sk1.sketch, amount=-CUT_EXTRUDE_10_REACH, mode=Mode.PRIVATE) & part.part
    add(cut_extrude_10_tool1.solids().sort_by_distance((21, 67.89, 19.5))[0], mode=Mode.SUBTRACT)


solid = part.part
